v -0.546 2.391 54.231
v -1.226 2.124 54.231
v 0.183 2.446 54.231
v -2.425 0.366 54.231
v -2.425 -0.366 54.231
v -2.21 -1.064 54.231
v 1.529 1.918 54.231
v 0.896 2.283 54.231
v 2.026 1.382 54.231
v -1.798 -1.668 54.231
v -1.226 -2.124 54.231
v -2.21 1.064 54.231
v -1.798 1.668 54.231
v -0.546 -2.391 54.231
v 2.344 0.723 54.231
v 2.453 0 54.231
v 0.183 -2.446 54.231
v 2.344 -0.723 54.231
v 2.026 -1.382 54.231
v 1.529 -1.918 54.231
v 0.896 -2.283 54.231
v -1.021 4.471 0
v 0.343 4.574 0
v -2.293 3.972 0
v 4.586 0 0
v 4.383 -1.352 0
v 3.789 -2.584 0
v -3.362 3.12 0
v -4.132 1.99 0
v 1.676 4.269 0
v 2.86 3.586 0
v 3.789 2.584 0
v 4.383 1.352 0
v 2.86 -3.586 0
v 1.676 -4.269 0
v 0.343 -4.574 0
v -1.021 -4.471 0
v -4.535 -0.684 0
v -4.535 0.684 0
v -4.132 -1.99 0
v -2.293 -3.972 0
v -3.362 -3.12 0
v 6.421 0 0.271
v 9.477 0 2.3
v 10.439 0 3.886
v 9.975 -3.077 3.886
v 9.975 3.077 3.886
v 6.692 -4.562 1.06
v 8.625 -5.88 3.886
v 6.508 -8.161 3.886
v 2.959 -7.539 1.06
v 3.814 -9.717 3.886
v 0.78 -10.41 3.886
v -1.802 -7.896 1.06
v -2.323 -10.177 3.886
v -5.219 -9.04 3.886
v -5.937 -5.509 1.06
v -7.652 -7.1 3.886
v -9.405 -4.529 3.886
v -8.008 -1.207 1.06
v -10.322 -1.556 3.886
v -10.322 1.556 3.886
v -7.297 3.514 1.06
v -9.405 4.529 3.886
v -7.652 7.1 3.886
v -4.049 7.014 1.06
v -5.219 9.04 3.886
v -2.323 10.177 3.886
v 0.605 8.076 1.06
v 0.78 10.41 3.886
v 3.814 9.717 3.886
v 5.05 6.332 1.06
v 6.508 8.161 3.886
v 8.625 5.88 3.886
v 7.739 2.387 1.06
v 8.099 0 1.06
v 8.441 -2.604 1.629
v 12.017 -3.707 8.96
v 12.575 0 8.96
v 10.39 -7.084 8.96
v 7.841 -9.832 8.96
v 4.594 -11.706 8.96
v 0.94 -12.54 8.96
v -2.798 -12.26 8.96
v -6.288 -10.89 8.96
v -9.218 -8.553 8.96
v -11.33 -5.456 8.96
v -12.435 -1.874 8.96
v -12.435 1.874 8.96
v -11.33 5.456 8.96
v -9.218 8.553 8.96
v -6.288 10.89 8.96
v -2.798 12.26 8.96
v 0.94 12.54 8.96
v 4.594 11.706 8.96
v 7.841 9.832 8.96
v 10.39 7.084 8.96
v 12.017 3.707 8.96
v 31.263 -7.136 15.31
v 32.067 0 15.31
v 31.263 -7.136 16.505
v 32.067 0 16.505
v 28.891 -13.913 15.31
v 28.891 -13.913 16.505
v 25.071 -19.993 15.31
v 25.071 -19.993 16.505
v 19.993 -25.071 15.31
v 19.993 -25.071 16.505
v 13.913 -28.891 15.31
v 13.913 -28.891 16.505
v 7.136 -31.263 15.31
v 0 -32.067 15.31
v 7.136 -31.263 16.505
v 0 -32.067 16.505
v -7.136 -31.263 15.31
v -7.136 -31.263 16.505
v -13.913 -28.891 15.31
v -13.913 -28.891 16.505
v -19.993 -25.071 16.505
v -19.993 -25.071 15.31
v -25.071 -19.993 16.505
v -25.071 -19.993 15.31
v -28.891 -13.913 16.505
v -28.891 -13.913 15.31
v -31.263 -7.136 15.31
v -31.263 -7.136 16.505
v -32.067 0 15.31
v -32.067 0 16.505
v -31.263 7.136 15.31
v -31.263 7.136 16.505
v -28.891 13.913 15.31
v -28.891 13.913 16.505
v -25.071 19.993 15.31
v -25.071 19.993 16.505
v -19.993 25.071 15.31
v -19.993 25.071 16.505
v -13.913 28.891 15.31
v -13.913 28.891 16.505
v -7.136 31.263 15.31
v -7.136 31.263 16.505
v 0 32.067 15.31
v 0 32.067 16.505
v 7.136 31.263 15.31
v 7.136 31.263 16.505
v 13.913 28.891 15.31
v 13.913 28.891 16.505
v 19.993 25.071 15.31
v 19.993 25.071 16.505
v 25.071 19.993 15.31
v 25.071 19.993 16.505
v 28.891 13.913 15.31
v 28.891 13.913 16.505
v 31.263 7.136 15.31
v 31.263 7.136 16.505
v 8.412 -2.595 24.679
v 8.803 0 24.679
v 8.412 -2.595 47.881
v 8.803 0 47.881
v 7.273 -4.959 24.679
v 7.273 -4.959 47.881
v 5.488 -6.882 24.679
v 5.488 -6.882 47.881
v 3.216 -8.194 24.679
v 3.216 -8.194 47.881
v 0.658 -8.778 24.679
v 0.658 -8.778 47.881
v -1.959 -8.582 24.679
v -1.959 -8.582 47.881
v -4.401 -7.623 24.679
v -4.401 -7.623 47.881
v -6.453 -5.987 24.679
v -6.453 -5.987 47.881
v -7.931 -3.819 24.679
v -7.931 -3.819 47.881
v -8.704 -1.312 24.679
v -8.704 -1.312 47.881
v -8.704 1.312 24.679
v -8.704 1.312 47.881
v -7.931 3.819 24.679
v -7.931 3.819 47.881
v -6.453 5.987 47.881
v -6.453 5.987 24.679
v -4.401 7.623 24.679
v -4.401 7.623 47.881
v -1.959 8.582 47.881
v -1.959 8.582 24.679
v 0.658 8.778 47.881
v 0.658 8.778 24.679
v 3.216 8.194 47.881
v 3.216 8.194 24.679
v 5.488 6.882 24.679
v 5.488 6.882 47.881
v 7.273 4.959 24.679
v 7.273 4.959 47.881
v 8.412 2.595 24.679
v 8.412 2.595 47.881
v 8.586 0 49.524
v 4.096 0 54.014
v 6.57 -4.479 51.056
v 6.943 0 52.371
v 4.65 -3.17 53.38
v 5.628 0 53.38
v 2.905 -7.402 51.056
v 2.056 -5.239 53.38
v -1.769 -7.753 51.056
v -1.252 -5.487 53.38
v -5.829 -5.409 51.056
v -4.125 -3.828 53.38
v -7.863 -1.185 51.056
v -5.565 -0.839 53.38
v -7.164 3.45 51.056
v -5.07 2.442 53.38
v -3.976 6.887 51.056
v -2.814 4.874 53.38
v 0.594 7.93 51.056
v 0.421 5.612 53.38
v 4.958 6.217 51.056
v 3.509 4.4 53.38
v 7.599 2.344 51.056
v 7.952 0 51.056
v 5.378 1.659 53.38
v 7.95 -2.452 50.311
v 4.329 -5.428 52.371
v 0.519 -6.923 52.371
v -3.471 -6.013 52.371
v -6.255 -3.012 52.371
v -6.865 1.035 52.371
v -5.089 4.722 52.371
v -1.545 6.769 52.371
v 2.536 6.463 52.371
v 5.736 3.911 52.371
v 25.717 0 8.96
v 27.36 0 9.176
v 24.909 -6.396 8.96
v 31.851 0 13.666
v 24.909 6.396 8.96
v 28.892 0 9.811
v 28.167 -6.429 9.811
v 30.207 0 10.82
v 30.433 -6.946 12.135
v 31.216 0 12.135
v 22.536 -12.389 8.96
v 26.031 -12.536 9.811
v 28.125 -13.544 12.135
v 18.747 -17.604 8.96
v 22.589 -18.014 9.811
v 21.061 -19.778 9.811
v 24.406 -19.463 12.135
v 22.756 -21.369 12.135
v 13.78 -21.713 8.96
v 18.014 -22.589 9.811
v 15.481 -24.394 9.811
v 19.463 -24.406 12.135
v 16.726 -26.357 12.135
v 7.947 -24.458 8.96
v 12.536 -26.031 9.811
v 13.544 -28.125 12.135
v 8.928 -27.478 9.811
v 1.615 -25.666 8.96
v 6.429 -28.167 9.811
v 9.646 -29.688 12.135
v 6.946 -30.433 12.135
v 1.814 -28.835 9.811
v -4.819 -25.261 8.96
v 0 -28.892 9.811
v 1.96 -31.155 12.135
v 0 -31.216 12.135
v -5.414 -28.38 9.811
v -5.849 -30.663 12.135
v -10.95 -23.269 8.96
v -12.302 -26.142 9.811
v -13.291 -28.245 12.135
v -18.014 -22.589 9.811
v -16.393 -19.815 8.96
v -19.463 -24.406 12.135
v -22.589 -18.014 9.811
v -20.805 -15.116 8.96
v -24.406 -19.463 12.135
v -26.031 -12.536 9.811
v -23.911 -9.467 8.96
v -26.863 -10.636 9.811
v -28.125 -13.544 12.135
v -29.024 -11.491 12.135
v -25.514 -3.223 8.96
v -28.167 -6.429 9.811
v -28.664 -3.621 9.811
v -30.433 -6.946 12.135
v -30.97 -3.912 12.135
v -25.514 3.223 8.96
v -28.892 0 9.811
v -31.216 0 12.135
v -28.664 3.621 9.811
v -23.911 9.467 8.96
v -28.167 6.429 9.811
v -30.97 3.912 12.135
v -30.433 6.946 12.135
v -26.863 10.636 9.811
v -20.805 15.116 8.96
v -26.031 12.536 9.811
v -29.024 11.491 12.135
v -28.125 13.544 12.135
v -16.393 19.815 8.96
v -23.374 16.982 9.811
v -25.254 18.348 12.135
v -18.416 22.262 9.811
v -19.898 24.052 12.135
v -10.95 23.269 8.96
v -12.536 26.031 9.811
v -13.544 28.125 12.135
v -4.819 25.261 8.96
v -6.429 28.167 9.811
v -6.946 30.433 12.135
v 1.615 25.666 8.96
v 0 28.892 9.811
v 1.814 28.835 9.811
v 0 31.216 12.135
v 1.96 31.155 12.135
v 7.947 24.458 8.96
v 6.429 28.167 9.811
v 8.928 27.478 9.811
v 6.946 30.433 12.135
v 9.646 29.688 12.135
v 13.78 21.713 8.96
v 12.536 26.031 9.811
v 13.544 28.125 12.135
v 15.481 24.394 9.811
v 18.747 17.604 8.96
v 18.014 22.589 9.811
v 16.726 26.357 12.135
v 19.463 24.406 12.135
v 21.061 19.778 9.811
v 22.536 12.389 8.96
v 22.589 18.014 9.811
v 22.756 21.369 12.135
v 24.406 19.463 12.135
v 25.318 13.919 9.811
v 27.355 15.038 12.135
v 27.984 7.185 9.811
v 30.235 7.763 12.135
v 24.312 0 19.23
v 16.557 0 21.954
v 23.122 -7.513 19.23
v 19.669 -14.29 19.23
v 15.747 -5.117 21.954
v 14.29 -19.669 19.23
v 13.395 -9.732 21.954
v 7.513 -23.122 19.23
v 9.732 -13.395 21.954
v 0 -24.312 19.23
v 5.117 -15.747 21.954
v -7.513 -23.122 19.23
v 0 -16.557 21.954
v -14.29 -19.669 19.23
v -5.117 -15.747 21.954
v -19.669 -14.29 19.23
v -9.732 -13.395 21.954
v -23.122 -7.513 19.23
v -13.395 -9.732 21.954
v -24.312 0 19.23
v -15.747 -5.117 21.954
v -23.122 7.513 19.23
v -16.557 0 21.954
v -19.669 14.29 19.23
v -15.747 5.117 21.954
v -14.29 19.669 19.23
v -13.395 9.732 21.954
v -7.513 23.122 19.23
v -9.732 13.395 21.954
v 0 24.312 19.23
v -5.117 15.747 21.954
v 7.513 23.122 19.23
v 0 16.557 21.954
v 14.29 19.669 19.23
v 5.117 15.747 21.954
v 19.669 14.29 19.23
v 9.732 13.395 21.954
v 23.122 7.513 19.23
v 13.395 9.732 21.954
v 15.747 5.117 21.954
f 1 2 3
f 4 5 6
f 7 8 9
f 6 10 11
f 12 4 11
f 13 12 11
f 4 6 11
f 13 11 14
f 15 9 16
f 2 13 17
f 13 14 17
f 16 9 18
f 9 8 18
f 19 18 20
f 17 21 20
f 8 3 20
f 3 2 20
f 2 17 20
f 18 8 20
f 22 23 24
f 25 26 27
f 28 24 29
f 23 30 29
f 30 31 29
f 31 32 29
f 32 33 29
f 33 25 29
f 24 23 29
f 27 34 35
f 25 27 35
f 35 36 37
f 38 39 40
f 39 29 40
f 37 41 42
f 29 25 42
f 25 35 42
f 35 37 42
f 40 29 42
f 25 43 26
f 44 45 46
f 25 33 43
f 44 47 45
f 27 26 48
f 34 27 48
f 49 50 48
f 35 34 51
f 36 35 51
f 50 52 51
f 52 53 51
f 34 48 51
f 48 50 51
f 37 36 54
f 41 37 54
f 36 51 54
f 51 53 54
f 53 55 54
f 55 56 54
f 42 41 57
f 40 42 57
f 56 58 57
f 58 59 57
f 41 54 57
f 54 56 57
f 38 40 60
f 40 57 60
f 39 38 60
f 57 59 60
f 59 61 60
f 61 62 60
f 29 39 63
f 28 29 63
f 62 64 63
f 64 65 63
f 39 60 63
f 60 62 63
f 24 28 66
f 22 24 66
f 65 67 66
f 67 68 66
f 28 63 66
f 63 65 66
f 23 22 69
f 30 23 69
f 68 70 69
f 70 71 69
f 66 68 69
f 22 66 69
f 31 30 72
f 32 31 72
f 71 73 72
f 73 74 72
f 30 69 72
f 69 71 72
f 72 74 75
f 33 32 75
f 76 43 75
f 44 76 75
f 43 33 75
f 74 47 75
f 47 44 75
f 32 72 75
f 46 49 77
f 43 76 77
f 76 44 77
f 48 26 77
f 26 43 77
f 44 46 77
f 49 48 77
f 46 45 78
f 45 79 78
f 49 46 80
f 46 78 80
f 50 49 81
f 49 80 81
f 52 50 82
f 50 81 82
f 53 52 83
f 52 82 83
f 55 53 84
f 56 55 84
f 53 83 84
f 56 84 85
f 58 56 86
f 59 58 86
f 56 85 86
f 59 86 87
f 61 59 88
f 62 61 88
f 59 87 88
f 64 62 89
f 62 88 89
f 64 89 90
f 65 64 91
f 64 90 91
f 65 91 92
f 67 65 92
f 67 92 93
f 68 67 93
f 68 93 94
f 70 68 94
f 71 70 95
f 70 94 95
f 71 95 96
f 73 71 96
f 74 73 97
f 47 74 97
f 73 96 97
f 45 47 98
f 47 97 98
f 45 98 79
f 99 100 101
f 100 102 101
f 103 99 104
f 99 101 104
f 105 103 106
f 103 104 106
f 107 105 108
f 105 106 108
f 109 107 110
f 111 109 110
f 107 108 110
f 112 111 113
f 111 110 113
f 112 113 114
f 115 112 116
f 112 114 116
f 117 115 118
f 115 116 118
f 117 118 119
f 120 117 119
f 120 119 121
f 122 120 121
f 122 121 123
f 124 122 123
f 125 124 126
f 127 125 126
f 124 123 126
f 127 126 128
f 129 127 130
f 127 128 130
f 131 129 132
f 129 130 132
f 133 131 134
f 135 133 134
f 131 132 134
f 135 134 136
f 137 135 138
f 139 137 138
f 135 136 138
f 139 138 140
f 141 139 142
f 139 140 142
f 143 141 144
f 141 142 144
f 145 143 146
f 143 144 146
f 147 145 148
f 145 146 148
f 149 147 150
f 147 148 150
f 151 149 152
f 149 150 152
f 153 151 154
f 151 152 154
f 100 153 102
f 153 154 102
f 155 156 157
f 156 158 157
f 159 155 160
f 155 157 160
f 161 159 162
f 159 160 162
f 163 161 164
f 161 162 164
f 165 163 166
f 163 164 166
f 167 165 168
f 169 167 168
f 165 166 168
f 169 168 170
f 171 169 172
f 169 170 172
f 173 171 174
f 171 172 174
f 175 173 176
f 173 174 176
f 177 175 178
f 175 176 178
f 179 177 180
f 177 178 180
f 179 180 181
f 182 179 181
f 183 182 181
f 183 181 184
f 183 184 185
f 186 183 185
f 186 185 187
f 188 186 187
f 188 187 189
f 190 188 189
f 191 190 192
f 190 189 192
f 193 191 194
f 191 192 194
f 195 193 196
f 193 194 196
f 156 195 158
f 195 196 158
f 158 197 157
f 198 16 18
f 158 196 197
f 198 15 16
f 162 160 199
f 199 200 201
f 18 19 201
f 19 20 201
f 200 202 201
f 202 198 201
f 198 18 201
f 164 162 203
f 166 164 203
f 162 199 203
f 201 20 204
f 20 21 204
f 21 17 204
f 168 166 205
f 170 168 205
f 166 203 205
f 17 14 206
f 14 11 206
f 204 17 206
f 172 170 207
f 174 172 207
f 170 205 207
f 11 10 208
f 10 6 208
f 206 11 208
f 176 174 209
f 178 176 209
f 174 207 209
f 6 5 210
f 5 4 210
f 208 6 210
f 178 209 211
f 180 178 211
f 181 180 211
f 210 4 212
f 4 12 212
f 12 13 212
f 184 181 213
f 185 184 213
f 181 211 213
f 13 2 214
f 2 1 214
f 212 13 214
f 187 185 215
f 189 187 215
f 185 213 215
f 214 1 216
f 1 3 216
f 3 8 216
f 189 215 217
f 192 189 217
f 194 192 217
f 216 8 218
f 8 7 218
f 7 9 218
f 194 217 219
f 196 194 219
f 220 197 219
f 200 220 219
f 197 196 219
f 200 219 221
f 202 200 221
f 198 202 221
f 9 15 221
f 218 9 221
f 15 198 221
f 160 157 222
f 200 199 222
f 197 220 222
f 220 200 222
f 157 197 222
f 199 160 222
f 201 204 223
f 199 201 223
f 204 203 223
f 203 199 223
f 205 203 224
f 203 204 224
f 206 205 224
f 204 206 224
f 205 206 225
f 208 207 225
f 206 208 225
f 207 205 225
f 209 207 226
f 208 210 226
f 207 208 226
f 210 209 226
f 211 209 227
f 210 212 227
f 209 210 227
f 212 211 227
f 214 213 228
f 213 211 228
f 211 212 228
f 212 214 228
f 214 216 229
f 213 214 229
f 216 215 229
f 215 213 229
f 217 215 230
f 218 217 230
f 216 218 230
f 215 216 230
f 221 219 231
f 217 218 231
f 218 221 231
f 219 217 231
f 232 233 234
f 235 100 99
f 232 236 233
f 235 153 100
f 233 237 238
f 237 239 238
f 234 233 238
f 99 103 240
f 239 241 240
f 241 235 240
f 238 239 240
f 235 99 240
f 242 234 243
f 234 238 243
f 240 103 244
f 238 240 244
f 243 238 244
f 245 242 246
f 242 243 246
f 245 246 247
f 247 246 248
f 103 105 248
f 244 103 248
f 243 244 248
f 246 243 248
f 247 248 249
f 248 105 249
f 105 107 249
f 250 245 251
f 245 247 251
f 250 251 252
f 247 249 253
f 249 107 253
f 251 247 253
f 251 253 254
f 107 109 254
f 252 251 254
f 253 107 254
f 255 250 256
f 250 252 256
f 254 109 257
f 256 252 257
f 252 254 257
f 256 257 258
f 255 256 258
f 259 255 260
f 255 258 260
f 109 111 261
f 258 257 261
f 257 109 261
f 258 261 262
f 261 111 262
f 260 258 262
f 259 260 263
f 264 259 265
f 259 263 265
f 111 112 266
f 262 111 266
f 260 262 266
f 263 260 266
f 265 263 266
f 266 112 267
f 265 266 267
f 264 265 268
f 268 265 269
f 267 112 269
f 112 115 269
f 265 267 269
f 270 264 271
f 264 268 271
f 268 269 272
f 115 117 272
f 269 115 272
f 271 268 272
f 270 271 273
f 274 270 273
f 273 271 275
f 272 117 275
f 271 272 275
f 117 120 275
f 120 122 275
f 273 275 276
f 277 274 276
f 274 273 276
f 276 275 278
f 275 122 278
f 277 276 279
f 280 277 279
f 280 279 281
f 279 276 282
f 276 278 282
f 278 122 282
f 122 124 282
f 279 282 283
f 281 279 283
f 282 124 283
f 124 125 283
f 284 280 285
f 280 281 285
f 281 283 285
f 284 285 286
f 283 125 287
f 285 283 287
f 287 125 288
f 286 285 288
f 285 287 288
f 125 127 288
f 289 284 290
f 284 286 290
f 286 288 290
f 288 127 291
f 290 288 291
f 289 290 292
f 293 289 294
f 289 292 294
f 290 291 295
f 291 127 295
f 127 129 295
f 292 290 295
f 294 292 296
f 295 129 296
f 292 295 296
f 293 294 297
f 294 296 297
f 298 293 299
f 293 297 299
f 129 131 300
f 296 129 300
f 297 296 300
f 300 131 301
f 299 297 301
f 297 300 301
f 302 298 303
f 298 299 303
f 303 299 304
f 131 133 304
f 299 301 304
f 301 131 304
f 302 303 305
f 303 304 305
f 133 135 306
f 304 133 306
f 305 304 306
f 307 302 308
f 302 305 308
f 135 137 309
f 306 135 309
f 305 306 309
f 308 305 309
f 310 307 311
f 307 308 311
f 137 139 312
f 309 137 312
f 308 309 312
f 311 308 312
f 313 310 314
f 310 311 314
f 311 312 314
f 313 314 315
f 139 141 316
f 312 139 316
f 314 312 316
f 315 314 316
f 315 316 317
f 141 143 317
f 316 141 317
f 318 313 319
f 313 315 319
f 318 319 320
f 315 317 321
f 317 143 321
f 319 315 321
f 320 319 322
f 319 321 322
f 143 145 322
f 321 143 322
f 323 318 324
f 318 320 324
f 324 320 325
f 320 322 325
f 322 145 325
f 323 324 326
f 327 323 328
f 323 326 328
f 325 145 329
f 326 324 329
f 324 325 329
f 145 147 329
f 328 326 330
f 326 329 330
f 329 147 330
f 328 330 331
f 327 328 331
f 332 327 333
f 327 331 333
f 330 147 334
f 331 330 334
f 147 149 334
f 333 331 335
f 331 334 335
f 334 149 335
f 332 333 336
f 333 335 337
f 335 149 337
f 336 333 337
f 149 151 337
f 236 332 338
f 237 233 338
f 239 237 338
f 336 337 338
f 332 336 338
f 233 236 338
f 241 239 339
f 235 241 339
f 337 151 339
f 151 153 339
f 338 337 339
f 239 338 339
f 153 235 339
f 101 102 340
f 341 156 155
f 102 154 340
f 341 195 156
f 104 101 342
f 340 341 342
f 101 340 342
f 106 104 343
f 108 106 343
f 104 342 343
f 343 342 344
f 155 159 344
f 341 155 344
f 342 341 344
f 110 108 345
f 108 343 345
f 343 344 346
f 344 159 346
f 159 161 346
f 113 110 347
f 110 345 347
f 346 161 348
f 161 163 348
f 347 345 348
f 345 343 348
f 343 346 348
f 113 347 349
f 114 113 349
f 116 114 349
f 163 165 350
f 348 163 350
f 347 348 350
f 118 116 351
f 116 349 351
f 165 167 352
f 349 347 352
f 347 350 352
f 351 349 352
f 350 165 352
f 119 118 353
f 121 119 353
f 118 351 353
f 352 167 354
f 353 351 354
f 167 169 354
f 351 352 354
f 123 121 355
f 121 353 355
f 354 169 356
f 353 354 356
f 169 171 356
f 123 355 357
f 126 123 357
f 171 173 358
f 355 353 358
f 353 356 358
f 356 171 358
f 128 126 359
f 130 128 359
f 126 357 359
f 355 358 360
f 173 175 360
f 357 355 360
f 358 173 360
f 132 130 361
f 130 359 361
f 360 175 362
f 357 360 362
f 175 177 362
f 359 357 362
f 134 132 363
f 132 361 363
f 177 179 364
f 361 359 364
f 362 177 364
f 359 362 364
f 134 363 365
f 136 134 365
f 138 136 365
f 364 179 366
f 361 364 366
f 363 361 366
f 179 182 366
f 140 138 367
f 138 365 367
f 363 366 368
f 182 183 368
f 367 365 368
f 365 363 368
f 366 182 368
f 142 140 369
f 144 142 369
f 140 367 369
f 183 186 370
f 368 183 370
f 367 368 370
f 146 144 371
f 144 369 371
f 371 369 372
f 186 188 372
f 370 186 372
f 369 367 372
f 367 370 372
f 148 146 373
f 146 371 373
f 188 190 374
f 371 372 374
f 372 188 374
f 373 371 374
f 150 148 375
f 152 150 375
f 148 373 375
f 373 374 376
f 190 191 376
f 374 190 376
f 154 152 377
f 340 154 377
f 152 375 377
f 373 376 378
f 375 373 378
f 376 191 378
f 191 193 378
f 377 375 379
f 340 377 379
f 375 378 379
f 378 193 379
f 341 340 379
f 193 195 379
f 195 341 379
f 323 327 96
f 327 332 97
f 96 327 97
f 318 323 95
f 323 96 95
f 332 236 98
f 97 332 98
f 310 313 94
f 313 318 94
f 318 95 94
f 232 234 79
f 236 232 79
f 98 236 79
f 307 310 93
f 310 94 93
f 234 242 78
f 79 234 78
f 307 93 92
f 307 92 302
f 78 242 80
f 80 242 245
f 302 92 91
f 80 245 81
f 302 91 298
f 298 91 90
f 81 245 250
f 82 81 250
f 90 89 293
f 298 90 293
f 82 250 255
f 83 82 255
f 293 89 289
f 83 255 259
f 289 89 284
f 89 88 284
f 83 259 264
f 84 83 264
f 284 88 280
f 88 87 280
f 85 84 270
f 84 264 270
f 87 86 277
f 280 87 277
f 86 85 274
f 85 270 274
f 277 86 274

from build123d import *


with BuildPart() as f1:
    # F0 (on Front) → F1 (revolve)
    with BuildSketch(Plane.XZ):
        with BuildLine():
            Line((0, 54.230746), (0, 0))
            Line((0, 0), (4.58643, 0))
            ThreePointArc((4.58643, 0), (8.098913, 1.059918), (10.438815, 3.885839))
            Line((10.438815, 3.885839), (12.575245, 8.959862))
            Line((12.575245, 8.959862), (25.716878, 8.959862))
            ThreePointArc((25.716878, 8.959862), (30.207006, 10.819734), (32.066878, 15.309862))
            Line((32.066878, 15.309862), (32.066878, 16.50501))
            Line((32.066878, 16.50501), (8.802673, 24.678919))
            Line((8.802673, 24.678919), (8.802673, 47.880746))
            ThreePointArc((8.802673, 47.880746), (6.942801, 52.370874), (2.452673, 54.230746))
            Line((2.452673, 54.230746), (0, 54.230746))
        make_face()
    revolve(axis=Axis((0, 0, 27.115373), (0, 0, -1)))


solid = f1.part
